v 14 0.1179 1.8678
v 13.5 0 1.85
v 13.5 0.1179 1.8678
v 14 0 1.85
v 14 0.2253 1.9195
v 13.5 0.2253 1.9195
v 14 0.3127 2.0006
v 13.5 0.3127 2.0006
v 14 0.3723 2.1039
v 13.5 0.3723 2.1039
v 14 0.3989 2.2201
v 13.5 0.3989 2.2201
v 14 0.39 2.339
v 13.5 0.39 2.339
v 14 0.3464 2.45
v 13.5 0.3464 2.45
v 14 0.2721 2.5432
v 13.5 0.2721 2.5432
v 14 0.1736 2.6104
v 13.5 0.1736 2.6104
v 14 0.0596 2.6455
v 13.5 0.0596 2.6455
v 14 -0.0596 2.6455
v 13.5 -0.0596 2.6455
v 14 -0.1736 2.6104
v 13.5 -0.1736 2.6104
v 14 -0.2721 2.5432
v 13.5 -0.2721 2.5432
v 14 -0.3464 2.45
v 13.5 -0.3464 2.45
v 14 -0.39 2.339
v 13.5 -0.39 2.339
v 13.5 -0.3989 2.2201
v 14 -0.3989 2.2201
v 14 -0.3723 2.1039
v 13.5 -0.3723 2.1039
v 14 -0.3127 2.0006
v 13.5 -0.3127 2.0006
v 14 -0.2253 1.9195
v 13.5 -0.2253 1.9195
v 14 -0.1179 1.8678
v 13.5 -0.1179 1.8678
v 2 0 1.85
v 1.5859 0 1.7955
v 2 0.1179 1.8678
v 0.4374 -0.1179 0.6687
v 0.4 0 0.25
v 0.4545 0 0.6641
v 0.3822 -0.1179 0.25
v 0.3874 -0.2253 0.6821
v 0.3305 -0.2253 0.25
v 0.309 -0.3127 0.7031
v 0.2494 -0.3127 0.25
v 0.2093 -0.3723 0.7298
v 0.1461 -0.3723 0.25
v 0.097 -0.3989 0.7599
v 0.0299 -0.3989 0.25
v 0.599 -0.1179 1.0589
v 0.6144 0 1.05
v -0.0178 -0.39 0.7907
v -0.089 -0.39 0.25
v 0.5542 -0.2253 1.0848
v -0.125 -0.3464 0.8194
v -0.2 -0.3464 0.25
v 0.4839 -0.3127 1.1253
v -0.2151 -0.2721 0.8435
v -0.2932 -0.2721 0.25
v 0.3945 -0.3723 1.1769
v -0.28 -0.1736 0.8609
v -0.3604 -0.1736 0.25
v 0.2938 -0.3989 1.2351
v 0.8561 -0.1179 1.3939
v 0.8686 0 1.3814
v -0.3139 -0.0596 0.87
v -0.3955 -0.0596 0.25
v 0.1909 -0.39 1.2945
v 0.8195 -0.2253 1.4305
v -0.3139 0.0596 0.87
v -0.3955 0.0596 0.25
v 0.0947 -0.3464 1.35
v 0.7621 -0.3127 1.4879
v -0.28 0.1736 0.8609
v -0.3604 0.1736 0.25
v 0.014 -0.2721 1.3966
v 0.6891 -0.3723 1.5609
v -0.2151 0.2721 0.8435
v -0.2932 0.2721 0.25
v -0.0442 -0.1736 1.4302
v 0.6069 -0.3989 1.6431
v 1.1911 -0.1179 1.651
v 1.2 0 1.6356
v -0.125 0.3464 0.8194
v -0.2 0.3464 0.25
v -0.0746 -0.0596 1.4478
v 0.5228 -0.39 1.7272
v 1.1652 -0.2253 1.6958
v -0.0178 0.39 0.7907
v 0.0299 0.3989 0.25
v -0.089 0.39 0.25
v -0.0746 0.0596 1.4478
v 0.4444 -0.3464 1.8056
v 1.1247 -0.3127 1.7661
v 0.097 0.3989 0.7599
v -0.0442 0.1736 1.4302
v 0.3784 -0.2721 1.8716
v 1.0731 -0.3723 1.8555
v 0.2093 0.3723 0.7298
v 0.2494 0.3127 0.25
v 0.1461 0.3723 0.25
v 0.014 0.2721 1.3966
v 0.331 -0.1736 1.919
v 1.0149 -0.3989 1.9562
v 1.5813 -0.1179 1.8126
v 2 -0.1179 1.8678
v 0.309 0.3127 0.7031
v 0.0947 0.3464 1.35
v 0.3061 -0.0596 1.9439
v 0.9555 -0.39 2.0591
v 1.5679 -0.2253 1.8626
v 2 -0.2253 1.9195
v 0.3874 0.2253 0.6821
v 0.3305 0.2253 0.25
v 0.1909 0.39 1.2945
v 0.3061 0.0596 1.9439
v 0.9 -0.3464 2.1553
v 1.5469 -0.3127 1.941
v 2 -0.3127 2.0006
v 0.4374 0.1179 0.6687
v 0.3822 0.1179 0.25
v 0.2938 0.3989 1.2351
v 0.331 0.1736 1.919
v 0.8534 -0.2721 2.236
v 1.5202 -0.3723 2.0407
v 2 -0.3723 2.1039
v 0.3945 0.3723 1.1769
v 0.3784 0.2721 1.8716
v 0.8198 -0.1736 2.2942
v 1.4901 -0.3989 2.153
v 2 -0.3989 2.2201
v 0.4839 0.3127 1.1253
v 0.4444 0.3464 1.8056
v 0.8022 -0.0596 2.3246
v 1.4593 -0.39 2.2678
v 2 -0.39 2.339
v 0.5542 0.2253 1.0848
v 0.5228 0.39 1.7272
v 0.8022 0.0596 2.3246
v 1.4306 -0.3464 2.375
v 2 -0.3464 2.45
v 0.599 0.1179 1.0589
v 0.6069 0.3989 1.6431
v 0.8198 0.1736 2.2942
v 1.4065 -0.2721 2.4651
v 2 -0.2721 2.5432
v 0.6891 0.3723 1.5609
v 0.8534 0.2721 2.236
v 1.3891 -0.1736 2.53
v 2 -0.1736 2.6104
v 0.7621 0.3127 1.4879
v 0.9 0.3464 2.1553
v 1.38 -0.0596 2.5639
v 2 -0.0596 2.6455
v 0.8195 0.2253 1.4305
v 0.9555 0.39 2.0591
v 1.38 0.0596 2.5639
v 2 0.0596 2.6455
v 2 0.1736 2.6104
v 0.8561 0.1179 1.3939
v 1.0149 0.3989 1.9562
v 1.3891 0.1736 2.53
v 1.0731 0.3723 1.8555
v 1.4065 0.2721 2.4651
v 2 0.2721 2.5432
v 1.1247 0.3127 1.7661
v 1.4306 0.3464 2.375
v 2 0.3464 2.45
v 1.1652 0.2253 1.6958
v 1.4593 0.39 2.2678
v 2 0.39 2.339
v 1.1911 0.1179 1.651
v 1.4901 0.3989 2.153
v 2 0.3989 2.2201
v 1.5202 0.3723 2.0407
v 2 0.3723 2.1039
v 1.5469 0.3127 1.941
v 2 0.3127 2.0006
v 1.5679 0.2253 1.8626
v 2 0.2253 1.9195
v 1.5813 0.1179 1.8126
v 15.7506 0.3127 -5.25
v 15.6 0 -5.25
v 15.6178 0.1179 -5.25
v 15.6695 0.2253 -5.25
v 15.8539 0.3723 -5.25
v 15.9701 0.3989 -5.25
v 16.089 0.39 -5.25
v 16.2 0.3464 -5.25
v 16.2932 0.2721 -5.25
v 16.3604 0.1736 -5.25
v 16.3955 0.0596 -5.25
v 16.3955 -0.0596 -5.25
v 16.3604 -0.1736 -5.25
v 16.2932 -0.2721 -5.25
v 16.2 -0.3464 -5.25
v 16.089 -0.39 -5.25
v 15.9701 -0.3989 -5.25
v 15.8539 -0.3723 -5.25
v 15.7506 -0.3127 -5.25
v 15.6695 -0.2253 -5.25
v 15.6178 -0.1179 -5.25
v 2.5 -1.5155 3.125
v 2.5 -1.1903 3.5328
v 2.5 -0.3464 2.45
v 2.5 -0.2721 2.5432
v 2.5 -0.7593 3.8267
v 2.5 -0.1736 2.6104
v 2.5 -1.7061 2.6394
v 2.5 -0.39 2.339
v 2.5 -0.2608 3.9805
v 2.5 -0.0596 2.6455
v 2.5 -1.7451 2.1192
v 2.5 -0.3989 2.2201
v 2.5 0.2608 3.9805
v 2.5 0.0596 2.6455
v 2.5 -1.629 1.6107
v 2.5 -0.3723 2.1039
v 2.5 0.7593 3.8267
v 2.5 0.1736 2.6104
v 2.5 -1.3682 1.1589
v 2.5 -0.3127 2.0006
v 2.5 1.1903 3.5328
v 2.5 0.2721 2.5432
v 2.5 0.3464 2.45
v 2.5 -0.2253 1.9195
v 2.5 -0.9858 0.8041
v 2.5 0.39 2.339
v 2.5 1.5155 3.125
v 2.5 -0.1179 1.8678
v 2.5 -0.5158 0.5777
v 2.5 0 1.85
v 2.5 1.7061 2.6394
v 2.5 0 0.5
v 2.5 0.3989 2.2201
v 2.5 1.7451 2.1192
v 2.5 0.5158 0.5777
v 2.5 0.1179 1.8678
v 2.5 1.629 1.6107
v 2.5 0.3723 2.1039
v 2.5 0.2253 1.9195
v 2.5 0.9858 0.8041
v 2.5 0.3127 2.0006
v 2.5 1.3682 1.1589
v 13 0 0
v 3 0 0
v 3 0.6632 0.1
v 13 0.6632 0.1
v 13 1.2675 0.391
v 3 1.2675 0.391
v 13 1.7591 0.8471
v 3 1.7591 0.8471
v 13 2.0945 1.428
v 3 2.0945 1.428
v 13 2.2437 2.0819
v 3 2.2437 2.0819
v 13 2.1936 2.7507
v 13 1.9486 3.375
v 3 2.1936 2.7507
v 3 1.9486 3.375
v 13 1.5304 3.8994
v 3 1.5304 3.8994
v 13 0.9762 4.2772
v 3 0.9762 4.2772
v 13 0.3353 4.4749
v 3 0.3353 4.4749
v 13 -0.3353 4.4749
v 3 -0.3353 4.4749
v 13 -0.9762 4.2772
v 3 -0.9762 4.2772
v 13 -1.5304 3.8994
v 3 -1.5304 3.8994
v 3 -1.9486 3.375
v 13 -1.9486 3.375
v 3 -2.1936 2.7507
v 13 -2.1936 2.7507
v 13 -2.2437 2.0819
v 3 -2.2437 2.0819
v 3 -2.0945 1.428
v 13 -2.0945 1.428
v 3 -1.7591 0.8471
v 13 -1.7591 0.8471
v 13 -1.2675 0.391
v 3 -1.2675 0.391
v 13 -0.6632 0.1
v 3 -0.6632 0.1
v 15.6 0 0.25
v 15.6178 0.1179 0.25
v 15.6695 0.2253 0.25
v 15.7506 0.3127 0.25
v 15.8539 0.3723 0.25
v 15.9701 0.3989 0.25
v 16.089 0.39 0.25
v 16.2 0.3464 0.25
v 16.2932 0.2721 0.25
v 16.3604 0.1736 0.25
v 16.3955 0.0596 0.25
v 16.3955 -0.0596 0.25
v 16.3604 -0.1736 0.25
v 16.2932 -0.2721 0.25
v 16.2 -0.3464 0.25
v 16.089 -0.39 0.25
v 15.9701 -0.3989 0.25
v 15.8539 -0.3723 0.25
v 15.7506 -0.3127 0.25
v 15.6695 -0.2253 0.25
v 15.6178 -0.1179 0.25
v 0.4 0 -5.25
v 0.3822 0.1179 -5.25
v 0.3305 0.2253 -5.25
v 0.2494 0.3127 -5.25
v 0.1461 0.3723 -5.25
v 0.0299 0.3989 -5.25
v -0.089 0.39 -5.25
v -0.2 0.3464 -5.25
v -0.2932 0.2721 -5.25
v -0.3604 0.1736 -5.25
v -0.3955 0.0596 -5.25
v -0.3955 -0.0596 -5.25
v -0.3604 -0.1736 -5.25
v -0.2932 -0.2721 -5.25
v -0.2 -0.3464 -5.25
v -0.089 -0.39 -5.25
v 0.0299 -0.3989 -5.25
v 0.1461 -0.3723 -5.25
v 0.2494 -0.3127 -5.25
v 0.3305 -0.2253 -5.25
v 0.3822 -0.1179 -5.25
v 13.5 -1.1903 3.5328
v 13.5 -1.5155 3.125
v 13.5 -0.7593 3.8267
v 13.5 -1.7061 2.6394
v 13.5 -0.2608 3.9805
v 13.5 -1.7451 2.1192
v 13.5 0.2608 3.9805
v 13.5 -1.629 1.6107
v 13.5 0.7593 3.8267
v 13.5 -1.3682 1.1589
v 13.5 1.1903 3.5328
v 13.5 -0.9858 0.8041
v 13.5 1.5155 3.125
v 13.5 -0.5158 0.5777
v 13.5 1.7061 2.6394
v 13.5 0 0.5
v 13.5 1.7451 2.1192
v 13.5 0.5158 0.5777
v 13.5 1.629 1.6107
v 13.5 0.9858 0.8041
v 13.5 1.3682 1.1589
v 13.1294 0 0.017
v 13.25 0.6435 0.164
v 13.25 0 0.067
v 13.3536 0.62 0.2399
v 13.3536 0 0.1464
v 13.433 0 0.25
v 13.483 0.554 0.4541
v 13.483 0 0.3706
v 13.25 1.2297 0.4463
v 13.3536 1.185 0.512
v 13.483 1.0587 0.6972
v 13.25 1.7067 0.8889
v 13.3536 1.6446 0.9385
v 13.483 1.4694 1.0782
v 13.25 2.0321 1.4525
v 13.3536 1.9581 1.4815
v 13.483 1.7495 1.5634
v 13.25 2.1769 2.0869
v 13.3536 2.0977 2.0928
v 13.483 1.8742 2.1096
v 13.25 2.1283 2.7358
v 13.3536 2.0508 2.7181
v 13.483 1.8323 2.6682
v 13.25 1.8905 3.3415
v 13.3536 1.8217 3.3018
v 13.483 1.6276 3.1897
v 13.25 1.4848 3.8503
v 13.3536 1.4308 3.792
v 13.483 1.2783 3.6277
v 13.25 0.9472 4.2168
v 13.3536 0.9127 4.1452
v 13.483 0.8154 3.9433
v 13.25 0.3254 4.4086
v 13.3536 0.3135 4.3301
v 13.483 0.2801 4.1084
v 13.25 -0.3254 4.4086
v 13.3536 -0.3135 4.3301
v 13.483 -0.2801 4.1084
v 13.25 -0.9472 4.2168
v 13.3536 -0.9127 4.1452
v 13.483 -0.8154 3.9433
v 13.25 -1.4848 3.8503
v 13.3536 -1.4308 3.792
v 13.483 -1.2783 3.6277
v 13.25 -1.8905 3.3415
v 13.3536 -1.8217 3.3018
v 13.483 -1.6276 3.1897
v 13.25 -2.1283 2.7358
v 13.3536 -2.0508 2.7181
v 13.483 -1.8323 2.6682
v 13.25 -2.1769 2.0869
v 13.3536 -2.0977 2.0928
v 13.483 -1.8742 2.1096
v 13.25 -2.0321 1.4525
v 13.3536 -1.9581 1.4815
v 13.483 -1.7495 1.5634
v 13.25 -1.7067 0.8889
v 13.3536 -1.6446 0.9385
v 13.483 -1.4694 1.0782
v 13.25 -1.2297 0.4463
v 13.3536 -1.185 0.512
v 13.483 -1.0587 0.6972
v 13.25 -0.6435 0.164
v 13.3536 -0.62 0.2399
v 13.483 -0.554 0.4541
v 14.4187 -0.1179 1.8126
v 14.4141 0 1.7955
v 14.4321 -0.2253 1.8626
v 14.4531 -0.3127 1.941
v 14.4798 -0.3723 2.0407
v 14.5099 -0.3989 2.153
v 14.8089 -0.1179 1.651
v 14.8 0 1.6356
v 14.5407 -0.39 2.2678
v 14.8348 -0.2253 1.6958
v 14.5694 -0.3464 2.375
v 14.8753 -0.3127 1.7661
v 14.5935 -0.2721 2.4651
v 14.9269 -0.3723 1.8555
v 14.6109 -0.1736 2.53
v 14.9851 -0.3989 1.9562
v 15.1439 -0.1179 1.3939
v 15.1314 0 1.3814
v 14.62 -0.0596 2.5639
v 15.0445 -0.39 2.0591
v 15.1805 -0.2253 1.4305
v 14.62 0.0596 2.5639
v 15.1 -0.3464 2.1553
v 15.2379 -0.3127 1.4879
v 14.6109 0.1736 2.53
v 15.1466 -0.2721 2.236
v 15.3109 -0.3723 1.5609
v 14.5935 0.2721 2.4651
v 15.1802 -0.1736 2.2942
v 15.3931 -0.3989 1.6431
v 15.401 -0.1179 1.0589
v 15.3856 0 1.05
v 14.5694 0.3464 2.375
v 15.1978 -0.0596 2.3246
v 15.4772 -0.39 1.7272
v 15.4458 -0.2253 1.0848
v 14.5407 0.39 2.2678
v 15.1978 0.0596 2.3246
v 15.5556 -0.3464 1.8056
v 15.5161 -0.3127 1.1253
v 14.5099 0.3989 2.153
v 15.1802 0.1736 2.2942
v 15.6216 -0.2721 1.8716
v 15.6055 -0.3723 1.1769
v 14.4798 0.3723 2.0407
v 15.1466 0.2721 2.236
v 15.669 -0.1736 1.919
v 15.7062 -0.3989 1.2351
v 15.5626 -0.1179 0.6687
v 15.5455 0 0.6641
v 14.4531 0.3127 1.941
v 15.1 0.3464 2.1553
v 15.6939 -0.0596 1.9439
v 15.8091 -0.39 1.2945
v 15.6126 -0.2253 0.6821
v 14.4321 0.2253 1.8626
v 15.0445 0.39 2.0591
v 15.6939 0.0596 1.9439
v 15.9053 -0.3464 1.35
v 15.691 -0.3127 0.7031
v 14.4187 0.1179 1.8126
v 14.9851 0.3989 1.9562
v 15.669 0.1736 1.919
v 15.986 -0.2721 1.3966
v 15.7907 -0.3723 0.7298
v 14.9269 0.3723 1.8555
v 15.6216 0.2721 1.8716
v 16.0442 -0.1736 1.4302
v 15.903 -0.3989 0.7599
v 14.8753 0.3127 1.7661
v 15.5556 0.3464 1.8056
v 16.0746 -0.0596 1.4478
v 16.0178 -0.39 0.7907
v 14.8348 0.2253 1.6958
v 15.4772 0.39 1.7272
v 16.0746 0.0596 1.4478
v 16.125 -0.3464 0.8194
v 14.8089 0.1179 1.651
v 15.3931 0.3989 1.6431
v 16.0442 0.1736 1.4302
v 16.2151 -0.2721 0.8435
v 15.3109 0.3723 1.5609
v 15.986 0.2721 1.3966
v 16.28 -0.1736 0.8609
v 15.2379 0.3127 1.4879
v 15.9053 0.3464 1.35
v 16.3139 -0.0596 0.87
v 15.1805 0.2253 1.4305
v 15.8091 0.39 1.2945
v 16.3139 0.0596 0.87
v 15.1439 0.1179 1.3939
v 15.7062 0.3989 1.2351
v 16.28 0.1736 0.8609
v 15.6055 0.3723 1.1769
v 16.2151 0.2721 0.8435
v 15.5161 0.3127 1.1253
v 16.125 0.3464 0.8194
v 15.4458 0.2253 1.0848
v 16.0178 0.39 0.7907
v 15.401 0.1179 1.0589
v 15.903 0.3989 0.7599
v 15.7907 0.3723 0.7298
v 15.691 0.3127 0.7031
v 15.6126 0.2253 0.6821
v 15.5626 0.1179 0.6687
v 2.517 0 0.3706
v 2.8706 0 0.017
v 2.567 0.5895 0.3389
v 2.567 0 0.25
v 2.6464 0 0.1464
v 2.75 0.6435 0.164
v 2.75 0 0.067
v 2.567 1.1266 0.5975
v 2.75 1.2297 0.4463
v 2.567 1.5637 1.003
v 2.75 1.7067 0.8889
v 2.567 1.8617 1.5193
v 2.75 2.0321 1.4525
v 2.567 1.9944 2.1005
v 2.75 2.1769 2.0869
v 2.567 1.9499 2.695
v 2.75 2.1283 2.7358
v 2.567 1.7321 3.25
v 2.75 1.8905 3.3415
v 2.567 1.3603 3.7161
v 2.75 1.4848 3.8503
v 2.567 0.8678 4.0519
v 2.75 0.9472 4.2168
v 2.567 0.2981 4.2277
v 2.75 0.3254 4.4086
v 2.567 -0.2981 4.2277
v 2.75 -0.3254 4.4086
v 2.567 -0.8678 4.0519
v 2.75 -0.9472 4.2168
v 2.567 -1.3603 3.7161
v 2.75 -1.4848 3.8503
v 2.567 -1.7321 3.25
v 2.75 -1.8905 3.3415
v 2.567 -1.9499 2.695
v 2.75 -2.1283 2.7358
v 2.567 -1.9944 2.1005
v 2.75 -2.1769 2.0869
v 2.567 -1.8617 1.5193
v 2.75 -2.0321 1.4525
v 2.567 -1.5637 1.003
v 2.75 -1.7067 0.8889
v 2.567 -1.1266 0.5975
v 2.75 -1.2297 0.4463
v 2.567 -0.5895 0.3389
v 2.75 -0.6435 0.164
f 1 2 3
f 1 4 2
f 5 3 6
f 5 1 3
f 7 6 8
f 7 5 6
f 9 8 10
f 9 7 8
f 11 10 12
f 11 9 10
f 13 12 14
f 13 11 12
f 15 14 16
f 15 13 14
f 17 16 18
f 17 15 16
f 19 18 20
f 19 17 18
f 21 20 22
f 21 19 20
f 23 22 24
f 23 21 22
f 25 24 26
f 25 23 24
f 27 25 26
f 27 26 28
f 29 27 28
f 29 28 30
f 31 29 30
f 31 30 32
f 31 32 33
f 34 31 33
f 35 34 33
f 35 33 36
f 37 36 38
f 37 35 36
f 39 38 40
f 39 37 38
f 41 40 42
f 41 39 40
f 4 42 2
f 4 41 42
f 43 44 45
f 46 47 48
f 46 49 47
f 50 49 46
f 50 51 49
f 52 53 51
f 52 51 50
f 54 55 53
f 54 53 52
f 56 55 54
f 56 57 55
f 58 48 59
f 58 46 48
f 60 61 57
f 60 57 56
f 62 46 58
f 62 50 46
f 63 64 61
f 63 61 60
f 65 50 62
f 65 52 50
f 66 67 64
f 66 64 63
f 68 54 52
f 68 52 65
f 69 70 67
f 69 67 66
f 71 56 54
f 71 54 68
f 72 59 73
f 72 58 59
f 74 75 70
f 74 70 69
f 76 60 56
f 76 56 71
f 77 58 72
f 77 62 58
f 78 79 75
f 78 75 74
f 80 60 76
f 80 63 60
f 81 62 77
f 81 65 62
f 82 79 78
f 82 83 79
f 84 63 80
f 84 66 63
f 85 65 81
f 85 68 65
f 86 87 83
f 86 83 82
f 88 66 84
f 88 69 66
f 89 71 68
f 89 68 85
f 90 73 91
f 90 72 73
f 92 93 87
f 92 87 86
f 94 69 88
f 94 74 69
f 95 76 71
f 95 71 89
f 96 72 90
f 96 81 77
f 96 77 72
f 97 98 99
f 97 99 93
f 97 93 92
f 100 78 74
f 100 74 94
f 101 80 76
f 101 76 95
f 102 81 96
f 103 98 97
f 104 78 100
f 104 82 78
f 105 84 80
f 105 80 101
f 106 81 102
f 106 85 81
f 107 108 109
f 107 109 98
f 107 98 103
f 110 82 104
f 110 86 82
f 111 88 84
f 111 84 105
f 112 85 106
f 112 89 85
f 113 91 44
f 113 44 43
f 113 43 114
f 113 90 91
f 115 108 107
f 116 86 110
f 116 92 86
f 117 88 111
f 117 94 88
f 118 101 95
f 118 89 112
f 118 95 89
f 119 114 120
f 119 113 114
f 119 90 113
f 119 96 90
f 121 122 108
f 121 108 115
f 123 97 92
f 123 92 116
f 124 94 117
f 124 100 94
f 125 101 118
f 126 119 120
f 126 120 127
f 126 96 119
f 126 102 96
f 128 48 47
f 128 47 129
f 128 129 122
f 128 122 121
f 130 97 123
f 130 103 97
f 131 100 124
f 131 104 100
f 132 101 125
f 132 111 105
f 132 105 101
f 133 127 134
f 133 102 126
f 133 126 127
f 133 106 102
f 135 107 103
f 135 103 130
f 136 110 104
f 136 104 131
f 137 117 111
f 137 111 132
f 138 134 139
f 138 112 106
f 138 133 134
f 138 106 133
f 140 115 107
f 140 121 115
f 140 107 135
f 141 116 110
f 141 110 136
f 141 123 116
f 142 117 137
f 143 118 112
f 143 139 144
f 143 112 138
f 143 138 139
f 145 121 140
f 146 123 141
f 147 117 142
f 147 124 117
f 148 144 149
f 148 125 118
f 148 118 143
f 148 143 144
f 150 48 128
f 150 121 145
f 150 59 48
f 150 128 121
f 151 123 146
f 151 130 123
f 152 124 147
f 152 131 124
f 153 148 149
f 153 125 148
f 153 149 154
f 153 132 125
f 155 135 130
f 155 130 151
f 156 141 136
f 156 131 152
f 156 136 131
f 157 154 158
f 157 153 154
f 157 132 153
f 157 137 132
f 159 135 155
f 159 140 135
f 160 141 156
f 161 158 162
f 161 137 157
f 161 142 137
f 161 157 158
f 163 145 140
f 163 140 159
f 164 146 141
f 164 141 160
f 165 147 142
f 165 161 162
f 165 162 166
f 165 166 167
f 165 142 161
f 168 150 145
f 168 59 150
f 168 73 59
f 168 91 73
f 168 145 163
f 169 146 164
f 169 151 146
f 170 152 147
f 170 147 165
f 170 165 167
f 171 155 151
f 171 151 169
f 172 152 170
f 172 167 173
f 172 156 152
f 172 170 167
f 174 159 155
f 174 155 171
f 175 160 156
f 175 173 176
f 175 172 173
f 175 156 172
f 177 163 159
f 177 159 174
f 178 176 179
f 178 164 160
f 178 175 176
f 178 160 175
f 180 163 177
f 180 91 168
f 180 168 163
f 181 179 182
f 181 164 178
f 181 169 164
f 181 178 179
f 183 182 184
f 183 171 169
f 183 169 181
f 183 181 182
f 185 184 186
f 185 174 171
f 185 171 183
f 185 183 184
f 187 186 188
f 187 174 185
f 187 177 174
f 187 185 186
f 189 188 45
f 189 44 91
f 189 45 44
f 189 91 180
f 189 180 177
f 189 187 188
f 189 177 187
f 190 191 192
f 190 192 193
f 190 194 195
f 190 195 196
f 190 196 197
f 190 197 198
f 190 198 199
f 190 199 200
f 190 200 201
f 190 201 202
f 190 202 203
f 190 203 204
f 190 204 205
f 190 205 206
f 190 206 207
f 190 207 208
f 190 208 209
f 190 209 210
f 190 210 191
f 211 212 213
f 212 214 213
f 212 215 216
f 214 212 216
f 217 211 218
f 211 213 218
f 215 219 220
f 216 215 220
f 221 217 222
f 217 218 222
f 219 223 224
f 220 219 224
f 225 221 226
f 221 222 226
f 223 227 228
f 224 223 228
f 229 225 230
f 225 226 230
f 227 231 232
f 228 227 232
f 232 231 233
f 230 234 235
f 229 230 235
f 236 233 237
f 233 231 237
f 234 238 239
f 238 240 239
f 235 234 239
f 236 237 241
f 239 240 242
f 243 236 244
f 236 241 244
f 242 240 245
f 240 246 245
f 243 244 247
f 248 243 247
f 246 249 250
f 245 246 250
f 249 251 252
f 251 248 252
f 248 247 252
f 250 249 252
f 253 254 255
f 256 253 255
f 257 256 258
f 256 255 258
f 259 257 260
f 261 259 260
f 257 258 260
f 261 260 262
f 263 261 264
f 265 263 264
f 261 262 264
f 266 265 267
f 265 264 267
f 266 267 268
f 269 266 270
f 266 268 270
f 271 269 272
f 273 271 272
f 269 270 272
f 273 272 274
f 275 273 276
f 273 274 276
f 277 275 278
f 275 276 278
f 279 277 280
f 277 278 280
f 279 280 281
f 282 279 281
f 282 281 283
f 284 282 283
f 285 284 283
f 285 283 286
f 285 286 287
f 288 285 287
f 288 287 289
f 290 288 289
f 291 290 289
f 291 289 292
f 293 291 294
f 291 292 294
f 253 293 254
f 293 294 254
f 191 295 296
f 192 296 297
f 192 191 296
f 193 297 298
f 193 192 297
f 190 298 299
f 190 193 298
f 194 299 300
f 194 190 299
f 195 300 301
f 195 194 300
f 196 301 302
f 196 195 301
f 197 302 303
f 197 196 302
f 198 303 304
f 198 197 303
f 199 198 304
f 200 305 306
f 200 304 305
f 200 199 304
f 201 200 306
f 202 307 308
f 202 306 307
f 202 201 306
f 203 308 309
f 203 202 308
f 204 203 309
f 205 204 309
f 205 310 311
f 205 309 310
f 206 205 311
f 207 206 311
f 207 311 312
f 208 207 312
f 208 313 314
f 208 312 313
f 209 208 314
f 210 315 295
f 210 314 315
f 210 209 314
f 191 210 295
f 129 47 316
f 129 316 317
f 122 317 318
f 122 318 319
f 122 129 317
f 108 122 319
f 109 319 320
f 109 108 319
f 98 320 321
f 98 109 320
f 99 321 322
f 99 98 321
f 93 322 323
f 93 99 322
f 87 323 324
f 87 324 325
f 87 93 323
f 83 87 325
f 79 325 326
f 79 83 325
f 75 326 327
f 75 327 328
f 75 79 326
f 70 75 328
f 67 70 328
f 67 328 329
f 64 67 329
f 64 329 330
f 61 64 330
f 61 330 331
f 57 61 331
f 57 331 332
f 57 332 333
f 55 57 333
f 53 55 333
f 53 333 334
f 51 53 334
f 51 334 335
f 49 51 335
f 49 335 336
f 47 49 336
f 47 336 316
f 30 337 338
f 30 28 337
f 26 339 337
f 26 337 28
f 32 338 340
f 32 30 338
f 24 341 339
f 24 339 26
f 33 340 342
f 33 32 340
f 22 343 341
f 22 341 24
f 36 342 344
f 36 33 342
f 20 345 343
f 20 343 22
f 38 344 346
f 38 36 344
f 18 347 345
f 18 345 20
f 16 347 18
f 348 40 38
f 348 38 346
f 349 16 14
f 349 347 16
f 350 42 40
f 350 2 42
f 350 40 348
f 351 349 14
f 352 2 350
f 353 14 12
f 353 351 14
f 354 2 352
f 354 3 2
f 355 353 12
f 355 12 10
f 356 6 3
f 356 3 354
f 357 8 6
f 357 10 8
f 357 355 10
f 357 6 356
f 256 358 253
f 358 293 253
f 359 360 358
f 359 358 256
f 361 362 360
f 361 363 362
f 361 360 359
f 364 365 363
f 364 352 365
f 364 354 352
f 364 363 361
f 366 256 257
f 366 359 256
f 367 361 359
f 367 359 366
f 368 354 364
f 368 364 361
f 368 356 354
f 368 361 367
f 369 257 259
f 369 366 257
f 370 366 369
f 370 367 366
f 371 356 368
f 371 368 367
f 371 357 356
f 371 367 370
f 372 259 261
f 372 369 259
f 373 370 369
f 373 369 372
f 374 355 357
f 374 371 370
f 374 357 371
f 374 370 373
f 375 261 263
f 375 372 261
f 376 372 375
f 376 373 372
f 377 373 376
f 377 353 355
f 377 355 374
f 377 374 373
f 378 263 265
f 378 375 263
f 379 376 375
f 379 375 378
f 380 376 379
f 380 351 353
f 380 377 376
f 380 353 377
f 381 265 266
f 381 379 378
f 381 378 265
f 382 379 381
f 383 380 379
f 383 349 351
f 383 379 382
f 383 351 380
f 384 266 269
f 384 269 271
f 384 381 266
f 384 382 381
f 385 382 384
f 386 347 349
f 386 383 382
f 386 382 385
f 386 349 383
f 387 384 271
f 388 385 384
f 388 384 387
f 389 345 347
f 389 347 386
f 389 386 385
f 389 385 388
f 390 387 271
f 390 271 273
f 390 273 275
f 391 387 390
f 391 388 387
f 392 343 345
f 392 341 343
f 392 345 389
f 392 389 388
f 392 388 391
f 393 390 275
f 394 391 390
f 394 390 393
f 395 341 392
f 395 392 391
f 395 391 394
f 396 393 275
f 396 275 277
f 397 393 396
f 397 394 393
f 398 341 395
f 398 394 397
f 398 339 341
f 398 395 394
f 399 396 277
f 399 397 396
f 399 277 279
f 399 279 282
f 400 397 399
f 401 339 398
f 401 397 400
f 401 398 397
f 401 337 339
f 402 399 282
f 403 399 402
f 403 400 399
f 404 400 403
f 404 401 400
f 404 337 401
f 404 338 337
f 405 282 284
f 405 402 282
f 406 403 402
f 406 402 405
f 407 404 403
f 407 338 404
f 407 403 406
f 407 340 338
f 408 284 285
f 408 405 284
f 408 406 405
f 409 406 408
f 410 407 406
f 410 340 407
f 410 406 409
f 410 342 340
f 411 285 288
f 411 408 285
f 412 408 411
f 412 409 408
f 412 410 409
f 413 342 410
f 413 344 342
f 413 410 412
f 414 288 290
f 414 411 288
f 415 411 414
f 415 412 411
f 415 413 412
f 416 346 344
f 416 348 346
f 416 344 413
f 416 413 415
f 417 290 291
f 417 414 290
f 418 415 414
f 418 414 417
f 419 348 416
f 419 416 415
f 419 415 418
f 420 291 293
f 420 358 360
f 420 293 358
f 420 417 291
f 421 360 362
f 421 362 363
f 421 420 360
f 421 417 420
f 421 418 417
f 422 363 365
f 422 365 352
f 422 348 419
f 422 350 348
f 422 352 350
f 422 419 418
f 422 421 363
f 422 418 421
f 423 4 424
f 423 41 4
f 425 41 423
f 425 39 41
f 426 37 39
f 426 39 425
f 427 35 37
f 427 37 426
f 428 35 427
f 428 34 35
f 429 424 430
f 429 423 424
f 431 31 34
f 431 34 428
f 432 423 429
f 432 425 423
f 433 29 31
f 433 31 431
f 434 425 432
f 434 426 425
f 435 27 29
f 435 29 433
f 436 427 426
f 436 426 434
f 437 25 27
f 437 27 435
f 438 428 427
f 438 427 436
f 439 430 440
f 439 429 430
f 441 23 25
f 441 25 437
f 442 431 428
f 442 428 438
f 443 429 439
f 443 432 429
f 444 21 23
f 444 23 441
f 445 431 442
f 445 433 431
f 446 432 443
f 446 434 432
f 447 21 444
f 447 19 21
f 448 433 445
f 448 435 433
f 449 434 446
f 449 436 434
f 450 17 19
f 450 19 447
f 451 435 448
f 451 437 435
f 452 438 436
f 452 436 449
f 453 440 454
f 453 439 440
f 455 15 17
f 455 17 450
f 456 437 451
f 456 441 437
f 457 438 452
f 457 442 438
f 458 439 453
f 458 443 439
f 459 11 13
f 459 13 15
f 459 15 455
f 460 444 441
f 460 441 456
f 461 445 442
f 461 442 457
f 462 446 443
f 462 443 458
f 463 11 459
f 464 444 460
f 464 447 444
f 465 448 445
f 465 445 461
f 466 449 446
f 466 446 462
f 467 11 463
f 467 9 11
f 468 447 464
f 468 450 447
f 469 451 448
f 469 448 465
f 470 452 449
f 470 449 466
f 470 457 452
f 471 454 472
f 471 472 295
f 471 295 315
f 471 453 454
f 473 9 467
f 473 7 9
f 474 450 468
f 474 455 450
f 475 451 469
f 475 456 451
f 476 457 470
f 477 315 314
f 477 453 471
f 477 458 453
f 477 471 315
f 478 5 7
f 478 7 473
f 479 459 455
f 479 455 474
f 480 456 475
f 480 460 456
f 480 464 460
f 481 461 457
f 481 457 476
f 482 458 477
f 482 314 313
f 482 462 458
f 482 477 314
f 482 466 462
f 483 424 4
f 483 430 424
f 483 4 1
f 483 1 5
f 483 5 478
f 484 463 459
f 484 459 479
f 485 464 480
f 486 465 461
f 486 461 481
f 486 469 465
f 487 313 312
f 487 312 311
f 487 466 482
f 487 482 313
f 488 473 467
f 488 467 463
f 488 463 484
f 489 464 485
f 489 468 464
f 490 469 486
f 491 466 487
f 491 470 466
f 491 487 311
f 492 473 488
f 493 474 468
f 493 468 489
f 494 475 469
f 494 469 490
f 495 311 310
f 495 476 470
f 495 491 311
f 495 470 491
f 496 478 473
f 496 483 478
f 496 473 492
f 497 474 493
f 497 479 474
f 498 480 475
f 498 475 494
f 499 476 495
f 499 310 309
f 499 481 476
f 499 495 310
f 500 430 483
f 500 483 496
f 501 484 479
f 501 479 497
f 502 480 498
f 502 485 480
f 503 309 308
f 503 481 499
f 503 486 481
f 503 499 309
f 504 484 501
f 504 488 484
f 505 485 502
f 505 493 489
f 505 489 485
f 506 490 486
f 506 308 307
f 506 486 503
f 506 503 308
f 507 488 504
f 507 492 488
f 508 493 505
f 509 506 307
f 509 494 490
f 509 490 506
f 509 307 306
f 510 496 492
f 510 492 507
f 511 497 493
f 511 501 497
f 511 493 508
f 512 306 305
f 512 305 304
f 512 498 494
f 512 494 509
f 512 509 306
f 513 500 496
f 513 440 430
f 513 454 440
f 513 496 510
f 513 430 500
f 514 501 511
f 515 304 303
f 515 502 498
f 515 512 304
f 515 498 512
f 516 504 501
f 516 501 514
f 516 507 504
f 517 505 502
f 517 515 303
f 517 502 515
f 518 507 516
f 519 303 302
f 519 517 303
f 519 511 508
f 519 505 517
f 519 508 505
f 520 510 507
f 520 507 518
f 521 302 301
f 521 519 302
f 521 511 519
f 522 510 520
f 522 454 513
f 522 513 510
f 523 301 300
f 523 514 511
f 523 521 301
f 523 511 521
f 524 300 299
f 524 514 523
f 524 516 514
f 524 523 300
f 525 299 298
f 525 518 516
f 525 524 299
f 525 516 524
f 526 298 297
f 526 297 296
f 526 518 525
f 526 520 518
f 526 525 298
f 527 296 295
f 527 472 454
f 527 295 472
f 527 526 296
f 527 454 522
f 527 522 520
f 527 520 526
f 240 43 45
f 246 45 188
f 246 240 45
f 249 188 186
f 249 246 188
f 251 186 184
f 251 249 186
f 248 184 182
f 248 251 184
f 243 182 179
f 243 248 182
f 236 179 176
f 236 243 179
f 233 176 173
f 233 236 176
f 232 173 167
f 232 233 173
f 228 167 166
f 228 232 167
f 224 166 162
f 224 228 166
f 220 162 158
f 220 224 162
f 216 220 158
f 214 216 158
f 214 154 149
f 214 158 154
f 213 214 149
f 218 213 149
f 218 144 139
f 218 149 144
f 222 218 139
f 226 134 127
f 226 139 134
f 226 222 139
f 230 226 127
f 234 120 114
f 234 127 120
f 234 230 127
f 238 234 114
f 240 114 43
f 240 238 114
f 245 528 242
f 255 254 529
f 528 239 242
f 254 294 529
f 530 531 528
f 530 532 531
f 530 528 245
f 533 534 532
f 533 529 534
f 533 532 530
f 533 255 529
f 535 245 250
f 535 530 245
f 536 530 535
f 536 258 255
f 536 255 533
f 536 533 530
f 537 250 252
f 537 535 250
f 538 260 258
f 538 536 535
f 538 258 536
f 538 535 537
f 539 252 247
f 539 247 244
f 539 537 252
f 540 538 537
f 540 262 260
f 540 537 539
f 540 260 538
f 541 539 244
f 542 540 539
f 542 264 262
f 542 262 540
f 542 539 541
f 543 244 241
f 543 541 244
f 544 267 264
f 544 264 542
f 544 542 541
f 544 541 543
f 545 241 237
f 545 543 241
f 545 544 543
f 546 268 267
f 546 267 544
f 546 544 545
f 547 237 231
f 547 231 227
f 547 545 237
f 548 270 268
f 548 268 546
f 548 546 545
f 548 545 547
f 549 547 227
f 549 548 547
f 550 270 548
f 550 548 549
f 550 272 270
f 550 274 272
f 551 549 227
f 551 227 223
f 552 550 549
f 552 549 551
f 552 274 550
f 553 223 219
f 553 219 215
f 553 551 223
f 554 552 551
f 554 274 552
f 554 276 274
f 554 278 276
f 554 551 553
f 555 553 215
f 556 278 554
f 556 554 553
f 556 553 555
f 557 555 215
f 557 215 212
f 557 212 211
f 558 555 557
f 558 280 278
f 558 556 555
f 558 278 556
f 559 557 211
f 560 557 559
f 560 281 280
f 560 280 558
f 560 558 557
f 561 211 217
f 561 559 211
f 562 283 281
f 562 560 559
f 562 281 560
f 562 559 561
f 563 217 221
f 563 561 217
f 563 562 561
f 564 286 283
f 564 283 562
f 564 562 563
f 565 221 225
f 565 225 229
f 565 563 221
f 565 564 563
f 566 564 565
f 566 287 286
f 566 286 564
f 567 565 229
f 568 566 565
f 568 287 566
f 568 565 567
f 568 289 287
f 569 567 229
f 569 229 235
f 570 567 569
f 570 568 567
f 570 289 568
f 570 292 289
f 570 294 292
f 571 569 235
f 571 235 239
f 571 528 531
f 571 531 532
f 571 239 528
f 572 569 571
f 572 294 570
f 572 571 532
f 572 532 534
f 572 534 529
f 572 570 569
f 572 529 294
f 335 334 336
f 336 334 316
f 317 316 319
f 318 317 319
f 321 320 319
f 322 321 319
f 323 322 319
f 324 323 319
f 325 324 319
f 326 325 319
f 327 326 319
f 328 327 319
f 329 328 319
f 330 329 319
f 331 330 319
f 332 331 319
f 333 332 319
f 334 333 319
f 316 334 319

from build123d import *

# Parameters (mm, degrees)
SKETCH_3_R      = 2.25
EXTRUDE_1_DEPTH = 11
SKETCH_4_R      = 0.4
FILLET_1_R      = 0.5


with BuildPart() as part:
    # Эскиз3 → Вытянуть1 (new body)
    with BuildSketch(Plane(origin=(2.5, 0, 0), x_dir=(0, 0, -1), z_dir=(1, 0, 0))):
        with Locations((-2.25, 0)):
            Circle(SKETCH_3_R)
    extrude(amount=EXTRUDE_1_DEPTH)

    # По траектории1: sweep along a path in Эскиз5
    with BuildLine(Plane(origin=(0, 0, 0), x_dir=(1, 0, 0), z_dir=(0, 1, 0))) as sweep_1_path:
        Line((0, 5.25), (0, -0.25))
        ThreePointArc((0, -0.25), (0.585786438, -1.664213562), (2, -2.25))
        Line((2, -2.25), (2.965757317, -2.25))
        Line((2.965757317, -2.25), (14, -2.25))
        ThreePointArc((14, -2.25), (15.414213562, -1.664213562), (16, -0.25))
        Line((16, -0.25), (16, 5.25))
    # Эскиз4 → По траектории1 (sweep)
    with BuildSketch(Plane.XY.offset(-5.25)):
        Circle(SKETCH_4_R)
    sweep(path=sweep_1_path.line)

    # Скругление1
    fillet_1_edges = [part.edges().sort_by_distance(p)[0] for p in [
        (2.5, 0, 4.5),
        (13.5, 0, 4.5),
    ]]
    fillet(fillet_1_edges, radius=FILLET_1_R)


solid = part.part
